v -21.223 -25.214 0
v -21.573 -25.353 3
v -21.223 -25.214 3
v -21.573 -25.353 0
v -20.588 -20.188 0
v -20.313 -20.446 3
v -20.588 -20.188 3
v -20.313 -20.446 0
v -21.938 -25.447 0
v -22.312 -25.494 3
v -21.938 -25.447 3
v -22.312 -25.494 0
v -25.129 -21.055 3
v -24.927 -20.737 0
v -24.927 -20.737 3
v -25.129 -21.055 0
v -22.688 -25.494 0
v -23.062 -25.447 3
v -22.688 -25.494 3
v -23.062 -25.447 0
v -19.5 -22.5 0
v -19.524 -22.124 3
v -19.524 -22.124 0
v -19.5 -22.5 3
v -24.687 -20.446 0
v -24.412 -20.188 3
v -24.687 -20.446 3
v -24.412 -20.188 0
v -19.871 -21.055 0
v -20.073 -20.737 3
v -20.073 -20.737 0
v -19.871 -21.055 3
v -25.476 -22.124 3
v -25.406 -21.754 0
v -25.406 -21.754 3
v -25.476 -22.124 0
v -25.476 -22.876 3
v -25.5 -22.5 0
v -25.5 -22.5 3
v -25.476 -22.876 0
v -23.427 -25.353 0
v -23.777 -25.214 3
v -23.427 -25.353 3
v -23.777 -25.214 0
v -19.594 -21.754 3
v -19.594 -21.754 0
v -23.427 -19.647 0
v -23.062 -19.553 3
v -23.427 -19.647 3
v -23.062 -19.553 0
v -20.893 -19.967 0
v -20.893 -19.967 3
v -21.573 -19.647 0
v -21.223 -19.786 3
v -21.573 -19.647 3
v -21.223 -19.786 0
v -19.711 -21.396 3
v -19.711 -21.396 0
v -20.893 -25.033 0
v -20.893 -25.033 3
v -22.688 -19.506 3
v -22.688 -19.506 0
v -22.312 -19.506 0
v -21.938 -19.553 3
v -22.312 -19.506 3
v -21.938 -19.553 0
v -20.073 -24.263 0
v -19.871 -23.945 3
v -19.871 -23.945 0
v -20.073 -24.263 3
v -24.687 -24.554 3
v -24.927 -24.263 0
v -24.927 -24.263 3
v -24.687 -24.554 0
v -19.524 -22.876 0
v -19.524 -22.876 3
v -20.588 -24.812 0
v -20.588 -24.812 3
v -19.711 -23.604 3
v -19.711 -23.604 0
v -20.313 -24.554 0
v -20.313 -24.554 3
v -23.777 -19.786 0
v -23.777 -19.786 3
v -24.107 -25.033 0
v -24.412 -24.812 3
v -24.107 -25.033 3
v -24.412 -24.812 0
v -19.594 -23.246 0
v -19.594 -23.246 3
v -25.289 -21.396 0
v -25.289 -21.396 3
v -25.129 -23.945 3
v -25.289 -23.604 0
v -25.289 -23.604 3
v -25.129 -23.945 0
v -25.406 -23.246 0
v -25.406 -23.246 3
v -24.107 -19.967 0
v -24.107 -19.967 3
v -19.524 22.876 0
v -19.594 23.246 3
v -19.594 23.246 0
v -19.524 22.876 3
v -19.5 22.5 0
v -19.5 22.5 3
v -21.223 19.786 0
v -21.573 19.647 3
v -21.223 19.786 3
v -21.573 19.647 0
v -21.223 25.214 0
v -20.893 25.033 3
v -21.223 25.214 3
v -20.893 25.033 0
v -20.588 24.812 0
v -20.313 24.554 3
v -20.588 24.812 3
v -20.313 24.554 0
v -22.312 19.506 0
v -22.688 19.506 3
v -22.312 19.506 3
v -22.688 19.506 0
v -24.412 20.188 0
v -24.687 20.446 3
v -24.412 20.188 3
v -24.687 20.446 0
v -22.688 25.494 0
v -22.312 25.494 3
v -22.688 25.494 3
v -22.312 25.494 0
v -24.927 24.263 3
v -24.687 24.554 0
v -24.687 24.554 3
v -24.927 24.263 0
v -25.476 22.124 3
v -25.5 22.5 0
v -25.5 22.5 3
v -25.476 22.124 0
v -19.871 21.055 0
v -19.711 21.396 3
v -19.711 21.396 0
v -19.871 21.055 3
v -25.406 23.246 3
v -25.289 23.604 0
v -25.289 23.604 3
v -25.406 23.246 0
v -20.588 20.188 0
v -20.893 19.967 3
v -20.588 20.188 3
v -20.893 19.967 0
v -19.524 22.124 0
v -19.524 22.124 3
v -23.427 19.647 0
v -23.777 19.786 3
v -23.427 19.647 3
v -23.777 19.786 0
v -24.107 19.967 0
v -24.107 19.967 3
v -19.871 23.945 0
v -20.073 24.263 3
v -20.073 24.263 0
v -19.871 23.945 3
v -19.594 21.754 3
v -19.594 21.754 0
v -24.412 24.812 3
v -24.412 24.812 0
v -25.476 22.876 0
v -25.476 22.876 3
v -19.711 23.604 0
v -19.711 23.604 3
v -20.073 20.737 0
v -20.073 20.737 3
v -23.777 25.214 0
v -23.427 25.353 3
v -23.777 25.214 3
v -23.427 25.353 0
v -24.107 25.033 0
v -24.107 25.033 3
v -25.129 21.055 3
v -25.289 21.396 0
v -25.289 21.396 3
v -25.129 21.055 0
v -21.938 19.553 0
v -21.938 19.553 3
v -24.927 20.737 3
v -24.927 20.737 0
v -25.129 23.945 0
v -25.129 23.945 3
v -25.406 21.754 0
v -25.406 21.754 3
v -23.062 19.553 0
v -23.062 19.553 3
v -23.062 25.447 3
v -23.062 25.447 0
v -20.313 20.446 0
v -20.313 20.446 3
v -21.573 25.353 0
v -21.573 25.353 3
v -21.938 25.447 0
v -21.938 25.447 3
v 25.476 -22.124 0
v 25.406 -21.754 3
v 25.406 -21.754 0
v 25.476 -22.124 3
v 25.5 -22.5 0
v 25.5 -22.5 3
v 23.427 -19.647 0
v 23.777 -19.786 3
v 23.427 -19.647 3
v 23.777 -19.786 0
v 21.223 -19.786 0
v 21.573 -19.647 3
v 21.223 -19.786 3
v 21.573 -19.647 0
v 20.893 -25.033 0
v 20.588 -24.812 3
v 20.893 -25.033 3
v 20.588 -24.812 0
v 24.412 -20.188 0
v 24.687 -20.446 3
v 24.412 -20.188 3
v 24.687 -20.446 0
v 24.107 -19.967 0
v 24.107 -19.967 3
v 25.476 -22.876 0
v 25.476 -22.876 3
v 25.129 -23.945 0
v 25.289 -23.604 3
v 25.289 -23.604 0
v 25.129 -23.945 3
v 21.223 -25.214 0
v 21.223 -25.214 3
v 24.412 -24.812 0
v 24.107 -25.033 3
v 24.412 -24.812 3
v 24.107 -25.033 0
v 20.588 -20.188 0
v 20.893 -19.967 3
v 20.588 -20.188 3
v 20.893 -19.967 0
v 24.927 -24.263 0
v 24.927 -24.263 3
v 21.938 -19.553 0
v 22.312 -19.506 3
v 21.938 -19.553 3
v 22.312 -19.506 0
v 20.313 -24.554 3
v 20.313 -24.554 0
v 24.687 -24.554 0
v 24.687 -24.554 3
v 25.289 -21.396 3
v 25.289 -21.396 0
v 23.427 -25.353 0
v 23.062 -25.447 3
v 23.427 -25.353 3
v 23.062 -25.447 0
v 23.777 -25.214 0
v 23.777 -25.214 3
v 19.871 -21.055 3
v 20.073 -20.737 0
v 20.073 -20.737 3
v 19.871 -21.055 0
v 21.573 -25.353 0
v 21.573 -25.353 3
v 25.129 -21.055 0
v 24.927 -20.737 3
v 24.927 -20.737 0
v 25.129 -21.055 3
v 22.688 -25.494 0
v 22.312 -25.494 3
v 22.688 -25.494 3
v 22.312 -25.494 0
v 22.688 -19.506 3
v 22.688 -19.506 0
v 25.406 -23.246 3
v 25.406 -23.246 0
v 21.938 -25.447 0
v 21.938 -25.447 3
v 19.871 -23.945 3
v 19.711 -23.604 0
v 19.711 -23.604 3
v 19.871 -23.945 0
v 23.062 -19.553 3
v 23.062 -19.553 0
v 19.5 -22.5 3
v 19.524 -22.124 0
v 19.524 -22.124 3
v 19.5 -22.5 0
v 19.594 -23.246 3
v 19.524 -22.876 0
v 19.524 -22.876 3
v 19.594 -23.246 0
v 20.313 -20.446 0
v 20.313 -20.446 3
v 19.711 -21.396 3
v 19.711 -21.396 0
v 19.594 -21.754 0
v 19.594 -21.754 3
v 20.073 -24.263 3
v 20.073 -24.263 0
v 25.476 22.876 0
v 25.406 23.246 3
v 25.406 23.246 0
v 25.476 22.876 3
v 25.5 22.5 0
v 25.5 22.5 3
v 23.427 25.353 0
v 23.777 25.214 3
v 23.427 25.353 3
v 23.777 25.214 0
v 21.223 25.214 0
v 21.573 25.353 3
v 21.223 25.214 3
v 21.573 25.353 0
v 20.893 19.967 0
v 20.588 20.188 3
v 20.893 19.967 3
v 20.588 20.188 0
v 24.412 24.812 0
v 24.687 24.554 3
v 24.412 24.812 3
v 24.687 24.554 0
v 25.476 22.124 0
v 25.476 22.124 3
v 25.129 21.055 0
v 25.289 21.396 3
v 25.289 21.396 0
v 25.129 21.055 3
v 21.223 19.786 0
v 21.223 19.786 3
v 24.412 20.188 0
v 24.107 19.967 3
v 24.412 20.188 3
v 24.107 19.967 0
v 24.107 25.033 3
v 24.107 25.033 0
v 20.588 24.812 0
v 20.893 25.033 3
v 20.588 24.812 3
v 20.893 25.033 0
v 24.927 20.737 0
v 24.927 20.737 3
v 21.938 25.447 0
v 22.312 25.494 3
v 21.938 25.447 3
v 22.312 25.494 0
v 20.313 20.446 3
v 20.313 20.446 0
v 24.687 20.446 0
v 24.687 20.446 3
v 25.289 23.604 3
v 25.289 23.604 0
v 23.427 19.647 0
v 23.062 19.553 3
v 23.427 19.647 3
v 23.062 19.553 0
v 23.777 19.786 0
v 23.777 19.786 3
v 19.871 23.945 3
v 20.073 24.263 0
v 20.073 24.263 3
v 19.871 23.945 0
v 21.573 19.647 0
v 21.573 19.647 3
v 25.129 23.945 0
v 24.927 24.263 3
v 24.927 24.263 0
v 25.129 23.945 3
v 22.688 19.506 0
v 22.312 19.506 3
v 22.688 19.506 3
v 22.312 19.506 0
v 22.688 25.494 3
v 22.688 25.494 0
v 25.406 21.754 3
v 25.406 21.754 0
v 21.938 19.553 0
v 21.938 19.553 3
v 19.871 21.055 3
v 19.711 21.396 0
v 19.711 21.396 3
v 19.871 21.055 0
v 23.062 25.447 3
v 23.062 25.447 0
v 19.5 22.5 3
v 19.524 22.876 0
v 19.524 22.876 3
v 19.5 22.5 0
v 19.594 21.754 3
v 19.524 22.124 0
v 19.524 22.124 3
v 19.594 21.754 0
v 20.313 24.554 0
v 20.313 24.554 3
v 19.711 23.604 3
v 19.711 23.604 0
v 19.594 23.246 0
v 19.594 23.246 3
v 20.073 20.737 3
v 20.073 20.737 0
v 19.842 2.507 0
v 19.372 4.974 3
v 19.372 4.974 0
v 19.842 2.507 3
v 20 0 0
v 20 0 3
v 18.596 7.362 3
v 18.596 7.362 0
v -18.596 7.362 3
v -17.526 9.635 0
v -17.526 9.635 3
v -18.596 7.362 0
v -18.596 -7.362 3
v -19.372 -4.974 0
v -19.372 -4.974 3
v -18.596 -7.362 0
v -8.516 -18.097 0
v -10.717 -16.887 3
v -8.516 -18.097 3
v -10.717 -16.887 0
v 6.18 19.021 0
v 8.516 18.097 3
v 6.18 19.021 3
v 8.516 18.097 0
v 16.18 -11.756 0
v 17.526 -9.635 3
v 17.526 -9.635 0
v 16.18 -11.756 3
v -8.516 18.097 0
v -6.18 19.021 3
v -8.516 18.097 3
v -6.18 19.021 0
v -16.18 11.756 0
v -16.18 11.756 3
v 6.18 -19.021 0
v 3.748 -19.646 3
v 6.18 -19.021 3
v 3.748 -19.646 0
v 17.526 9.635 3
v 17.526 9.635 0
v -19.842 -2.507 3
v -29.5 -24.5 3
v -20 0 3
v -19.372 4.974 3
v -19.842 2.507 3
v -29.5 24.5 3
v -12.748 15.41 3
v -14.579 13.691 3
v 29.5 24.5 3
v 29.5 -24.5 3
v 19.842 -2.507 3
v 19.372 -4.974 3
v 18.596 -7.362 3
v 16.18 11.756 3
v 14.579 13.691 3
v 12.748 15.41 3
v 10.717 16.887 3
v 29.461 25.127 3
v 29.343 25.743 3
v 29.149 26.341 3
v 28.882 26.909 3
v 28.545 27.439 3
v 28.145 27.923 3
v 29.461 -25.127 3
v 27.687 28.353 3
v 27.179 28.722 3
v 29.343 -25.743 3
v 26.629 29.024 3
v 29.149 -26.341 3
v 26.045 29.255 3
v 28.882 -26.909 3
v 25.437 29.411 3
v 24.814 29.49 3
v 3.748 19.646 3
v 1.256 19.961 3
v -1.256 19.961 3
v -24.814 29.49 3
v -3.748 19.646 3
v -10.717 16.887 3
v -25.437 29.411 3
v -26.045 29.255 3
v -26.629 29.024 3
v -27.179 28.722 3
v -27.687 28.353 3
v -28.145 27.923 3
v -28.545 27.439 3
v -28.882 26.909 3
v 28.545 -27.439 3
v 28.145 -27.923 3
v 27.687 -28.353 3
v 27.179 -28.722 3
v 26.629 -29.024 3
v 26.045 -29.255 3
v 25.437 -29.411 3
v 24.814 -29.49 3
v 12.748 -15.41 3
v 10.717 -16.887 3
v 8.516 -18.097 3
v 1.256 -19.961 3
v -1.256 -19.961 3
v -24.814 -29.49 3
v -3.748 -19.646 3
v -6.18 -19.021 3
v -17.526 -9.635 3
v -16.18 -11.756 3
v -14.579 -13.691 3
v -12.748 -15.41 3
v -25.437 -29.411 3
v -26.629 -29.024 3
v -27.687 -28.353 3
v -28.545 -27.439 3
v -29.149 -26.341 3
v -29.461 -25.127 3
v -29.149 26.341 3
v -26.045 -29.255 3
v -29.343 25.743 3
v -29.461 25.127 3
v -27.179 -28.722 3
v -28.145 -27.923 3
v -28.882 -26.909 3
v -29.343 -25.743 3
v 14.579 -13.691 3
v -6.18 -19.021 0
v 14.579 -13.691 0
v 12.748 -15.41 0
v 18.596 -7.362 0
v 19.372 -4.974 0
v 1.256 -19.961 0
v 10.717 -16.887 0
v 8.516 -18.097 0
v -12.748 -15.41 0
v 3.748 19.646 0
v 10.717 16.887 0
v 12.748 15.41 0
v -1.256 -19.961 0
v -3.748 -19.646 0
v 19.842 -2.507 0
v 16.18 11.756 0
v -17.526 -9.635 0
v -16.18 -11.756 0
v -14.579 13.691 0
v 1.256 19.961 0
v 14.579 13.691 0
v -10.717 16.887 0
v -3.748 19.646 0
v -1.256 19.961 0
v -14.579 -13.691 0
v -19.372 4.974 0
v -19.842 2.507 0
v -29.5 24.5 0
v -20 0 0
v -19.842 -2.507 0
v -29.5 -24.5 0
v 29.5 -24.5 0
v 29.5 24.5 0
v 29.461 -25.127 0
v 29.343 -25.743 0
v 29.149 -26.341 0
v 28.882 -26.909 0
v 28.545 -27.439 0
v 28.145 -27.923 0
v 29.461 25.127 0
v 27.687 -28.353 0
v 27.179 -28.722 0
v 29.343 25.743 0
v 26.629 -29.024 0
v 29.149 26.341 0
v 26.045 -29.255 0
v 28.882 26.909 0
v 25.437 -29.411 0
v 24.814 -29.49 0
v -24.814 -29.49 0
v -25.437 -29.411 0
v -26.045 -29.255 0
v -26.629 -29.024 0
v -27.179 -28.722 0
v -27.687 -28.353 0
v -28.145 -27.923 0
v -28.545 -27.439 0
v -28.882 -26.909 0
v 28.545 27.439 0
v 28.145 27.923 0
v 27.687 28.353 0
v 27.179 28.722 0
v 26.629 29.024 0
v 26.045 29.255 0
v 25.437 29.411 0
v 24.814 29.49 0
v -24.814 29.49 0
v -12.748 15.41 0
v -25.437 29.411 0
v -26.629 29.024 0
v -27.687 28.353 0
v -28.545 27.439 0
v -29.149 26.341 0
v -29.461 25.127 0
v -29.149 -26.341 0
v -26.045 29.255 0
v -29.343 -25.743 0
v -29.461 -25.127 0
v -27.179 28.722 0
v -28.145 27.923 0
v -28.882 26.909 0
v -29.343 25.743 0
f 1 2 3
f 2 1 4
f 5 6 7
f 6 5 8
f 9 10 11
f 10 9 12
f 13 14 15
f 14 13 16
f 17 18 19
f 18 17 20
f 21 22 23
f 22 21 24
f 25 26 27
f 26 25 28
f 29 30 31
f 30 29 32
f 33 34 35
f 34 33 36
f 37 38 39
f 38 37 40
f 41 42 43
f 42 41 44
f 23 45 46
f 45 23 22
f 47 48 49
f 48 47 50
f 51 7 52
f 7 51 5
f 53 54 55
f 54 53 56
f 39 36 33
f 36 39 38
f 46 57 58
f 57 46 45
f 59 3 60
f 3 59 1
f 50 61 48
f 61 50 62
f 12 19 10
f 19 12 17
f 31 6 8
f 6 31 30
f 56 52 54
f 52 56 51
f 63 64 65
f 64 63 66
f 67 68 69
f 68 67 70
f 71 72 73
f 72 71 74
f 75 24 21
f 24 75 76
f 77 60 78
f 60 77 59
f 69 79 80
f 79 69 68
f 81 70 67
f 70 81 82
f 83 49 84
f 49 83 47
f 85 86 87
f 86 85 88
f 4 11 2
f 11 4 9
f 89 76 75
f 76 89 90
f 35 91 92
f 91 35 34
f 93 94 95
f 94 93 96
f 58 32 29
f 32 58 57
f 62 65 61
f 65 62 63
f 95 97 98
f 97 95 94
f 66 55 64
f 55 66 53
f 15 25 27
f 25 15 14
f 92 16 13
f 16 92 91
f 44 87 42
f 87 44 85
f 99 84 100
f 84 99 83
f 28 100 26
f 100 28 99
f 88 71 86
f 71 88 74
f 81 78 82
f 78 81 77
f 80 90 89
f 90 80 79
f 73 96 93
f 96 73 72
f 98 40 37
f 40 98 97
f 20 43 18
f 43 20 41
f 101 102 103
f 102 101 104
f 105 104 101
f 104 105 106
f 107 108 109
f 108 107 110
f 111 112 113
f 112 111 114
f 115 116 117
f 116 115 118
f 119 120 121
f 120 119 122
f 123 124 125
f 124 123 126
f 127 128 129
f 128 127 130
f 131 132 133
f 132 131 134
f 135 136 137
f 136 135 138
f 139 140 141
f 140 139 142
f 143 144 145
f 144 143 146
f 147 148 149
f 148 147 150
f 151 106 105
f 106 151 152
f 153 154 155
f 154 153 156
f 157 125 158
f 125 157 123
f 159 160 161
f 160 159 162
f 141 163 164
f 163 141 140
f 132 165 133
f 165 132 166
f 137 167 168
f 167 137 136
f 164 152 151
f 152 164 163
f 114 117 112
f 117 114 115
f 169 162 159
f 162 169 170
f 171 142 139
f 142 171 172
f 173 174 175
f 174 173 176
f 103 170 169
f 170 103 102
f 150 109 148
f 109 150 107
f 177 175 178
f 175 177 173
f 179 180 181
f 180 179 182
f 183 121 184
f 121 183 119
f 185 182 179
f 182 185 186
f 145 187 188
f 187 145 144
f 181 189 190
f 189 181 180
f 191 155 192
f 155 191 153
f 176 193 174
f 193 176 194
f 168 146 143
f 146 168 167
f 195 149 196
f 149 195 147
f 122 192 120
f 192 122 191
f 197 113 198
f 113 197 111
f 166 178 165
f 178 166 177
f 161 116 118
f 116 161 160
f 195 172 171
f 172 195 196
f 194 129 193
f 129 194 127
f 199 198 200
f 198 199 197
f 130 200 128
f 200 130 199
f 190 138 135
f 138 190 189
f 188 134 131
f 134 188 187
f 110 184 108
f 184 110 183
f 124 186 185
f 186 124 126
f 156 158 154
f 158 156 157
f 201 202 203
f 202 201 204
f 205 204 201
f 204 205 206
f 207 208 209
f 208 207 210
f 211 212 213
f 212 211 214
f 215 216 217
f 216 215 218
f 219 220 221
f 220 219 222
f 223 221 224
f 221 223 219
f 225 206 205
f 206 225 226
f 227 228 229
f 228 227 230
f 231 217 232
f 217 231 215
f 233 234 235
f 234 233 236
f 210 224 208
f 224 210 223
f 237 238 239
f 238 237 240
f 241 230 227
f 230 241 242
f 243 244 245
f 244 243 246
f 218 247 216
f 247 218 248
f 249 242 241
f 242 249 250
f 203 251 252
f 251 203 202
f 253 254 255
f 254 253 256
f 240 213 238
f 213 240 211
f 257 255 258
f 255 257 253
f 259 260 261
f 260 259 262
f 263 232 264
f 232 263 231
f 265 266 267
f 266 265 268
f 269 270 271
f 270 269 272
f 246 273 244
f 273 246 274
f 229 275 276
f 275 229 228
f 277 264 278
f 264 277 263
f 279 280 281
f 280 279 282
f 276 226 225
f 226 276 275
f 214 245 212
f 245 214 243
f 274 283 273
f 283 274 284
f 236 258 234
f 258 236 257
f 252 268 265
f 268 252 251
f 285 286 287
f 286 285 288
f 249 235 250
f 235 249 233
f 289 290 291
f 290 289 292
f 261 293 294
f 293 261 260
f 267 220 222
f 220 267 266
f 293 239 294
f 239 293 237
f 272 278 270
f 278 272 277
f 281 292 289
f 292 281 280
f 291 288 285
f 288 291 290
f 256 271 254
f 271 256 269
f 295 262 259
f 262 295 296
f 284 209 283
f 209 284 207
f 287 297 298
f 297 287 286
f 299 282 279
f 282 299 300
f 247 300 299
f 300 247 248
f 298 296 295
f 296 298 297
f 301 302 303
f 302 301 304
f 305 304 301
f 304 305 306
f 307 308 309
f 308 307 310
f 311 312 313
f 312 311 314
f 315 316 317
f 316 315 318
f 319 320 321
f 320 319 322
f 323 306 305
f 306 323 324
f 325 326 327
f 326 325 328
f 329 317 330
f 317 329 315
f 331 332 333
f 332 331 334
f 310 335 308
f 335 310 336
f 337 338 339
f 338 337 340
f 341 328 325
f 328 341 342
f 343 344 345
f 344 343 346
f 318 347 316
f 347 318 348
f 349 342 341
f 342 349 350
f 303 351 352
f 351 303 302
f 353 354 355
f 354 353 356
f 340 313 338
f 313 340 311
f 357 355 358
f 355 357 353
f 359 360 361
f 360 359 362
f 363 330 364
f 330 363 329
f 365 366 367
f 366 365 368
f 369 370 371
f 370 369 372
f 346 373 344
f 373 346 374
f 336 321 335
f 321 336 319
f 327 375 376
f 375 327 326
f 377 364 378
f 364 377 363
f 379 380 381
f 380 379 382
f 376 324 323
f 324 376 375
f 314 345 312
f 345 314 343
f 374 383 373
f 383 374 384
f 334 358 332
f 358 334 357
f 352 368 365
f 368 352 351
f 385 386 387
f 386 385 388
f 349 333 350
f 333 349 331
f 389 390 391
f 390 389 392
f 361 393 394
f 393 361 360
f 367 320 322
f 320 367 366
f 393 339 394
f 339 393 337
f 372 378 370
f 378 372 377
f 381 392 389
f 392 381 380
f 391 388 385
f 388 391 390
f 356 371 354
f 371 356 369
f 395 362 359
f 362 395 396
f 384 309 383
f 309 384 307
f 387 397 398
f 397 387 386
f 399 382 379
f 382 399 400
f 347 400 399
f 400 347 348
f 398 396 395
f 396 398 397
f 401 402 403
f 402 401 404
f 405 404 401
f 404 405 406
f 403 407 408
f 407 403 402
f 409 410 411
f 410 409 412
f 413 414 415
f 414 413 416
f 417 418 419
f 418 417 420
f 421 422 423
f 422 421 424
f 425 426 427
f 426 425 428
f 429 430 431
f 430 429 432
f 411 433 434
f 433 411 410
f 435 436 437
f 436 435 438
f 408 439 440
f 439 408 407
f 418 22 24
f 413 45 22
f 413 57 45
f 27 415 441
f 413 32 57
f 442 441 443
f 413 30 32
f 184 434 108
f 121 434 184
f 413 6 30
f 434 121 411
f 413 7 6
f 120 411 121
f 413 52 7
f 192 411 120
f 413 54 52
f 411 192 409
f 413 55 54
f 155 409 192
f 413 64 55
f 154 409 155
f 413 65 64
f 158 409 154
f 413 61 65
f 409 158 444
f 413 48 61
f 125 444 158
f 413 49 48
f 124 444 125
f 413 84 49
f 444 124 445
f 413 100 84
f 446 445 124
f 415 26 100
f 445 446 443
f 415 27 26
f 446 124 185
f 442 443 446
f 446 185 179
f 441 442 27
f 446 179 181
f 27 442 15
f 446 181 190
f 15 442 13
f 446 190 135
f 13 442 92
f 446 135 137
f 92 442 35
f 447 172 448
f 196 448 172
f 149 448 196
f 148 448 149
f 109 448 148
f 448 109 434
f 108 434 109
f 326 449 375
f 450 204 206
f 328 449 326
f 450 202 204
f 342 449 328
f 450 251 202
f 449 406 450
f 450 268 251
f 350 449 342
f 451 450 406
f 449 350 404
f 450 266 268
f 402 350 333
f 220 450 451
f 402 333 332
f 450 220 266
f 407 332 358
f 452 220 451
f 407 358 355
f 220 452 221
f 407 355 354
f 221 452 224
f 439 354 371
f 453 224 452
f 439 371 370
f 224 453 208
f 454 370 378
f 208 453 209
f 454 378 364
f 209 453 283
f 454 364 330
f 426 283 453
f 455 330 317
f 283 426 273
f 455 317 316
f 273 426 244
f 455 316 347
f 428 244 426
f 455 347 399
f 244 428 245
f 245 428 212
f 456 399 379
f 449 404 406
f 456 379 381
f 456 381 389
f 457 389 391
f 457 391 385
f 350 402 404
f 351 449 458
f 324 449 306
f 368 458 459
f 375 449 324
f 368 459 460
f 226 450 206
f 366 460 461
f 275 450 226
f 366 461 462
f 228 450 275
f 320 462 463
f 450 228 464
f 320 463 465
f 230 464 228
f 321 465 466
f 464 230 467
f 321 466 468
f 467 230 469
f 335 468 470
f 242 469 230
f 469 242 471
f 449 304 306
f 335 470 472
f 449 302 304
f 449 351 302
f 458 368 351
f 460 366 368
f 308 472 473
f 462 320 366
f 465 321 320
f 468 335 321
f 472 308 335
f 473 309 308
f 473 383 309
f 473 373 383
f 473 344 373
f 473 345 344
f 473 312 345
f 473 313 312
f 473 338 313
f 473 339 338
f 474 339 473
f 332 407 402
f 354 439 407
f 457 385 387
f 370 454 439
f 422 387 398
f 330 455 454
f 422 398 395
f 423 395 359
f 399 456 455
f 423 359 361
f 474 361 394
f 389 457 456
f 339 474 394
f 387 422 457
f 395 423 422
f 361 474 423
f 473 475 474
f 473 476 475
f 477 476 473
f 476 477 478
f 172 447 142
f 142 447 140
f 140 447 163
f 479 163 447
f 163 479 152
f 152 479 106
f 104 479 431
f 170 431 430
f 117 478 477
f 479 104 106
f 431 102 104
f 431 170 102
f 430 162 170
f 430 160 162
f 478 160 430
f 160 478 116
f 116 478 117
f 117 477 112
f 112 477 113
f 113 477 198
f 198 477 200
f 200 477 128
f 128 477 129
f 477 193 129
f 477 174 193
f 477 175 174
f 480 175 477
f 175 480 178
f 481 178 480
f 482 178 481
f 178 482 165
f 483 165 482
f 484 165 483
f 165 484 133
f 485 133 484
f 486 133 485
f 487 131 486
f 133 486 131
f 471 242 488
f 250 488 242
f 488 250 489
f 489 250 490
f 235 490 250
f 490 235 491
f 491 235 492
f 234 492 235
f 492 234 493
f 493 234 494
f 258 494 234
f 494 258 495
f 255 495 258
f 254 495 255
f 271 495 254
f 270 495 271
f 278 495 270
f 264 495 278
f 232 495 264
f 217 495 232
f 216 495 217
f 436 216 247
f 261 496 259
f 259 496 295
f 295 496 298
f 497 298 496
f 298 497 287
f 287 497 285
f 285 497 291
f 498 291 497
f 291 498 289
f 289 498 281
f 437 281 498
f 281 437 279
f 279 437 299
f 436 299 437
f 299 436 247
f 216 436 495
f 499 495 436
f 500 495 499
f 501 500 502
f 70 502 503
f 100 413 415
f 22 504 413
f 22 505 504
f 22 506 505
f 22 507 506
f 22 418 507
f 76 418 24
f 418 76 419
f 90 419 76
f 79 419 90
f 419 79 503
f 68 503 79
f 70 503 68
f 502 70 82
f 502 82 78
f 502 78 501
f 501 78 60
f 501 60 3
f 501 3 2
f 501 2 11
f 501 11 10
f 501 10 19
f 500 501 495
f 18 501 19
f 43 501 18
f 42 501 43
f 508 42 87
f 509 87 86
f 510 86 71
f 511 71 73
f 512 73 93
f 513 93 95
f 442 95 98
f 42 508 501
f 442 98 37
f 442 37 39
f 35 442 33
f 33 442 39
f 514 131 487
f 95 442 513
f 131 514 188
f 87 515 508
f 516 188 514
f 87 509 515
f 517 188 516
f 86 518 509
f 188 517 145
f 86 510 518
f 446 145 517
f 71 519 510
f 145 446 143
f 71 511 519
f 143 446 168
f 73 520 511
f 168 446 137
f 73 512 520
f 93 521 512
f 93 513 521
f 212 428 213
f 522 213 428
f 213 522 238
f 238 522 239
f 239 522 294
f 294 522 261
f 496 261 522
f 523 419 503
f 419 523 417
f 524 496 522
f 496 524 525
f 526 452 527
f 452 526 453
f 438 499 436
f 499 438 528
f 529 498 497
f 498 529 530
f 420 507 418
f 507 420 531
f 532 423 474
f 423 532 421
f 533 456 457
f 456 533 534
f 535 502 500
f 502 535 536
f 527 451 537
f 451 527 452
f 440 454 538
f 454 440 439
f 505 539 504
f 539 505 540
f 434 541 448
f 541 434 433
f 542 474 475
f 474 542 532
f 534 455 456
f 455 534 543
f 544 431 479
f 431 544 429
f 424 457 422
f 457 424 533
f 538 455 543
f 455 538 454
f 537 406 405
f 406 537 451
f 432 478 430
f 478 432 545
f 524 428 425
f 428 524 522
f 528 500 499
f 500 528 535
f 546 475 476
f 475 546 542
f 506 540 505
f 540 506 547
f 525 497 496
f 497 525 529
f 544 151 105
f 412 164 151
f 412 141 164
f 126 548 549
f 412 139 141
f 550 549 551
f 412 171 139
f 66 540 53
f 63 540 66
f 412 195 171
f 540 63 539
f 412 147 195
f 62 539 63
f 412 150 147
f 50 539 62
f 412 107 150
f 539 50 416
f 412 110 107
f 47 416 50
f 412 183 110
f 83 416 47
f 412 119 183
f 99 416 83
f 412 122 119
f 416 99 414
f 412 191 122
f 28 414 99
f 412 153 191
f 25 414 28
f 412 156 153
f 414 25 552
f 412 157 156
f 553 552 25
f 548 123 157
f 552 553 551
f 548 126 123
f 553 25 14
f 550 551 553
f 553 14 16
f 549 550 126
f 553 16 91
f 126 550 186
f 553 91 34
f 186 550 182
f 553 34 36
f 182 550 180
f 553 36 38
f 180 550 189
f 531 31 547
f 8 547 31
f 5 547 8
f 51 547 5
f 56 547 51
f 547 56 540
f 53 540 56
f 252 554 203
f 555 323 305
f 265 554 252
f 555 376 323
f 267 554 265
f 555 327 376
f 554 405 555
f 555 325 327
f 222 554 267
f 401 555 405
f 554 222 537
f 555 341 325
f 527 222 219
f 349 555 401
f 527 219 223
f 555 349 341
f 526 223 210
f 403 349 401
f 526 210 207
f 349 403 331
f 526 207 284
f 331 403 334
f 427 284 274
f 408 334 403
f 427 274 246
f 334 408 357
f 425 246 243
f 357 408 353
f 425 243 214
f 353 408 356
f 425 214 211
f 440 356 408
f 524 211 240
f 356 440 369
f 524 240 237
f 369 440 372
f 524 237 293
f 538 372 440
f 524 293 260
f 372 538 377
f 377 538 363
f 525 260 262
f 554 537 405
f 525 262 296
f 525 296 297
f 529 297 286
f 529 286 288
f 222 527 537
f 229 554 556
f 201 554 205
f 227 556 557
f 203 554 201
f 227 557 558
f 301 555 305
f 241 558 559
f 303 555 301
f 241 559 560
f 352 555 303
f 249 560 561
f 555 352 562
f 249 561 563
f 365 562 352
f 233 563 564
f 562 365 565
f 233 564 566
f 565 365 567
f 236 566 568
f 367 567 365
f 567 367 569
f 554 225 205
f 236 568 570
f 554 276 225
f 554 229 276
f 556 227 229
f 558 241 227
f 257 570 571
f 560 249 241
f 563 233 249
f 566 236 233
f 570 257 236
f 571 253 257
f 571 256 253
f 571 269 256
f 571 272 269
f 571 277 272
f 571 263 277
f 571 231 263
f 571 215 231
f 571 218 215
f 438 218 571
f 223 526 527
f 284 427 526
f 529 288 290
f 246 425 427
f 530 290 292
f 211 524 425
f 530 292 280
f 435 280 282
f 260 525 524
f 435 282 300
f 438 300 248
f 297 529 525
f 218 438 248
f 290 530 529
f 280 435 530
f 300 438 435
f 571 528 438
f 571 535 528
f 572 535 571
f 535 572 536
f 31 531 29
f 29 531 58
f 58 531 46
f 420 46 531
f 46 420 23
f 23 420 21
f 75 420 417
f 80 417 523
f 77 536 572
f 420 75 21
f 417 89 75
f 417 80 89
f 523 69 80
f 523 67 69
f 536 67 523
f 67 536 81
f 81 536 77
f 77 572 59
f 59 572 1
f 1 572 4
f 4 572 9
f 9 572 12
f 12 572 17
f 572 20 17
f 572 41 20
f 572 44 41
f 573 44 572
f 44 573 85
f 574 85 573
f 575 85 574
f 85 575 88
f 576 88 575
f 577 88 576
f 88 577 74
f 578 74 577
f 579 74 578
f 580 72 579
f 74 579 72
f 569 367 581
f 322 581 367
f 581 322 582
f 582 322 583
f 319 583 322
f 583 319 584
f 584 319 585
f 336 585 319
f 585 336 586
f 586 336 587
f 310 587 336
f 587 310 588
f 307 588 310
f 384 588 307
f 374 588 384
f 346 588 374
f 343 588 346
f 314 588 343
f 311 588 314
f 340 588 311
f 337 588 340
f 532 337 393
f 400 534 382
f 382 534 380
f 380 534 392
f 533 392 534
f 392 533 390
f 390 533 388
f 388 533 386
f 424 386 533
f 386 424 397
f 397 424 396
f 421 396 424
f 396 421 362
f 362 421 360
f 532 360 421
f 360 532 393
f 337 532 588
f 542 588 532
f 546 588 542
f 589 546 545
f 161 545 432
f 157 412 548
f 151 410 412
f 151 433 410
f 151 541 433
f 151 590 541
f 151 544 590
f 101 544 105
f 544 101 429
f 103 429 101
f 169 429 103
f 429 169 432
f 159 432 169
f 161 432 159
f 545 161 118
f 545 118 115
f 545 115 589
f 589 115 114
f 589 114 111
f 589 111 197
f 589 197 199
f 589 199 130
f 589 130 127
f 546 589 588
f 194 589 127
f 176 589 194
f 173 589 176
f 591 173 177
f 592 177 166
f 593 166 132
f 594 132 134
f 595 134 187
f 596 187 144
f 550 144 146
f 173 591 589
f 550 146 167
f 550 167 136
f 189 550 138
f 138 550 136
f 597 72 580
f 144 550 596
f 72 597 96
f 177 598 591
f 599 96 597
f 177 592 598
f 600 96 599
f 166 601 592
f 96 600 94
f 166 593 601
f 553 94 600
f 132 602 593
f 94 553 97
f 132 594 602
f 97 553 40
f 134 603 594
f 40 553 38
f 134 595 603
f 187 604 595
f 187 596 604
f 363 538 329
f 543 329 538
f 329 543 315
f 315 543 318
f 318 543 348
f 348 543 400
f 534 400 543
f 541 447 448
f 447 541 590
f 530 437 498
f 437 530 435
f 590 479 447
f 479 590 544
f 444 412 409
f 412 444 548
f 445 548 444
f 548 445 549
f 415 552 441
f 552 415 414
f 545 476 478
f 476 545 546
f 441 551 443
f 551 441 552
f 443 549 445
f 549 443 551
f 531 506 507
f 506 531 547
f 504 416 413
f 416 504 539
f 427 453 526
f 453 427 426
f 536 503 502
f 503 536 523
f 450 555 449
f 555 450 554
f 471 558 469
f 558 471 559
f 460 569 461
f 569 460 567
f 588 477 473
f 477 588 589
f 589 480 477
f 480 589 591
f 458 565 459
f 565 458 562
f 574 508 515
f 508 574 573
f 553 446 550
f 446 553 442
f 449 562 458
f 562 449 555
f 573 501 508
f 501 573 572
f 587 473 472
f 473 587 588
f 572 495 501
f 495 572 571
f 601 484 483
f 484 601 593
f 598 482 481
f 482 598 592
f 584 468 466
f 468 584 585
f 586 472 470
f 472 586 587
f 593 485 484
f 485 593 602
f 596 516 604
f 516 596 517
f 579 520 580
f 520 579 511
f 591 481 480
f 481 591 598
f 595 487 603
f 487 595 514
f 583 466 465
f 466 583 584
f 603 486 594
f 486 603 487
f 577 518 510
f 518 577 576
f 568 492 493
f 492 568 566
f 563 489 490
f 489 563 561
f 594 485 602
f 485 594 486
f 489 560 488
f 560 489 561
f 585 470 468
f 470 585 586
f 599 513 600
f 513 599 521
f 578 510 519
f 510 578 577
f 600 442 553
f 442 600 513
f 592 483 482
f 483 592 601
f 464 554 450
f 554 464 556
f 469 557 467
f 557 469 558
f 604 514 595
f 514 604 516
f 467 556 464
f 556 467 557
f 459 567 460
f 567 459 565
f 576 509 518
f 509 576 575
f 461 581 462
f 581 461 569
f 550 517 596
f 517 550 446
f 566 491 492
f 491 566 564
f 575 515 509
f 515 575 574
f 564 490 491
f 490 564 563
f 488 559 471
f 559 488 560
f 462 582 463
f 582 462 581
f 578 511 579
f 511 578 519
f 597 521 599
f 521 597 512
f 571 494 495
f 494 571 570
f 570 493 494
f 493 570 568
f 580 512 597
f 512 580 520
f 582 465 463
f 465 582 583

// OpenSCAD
$fn = 50;


difference() {
	union() {
		hull() {
			translate(v = [-24.5000000000, 24.5000000000, 0]) {
				cylinder(h = 3, r = 5);
			}
			translate(v = [24.5000000000, 24.5000000000, 0]) {
				cylinder(h = 3, r = 5);
			}
			translate(v = [-24.5000000000, -24.5000000000, 0]) {
				cylinder(h = 3, r = 5);
			}
			translate(v = [24.5000000000, -24.5000000000, 0]) {
				cylinder(h = 3, r = 5);
			}
		}
	}
	union() {
		#translate(v = [-22.5000000000, -22.5000000000, -100.0000000000]) {
			cylinder(h = 200, r = 3.0000000000);
		}
		#translate(v = [-22.5000000000, 22.5000000000, -100.0000000000]) {
			cylinder(h = 200, r = 3.0000000000);
		}
		#translate(v = [22.5000000000, -22.5000000000, -100.0000000000]) {
			cylinder(h = 200, r = 3.0000000000);
		}
		#translate(v = [22.5000000000, 22.5000000000, -100.0000000000]) {
			cylinder(h = 200, r = 3.0000000000);
		}
		#cylinder(h = 3, r = 20.0000000000);
	}
}
